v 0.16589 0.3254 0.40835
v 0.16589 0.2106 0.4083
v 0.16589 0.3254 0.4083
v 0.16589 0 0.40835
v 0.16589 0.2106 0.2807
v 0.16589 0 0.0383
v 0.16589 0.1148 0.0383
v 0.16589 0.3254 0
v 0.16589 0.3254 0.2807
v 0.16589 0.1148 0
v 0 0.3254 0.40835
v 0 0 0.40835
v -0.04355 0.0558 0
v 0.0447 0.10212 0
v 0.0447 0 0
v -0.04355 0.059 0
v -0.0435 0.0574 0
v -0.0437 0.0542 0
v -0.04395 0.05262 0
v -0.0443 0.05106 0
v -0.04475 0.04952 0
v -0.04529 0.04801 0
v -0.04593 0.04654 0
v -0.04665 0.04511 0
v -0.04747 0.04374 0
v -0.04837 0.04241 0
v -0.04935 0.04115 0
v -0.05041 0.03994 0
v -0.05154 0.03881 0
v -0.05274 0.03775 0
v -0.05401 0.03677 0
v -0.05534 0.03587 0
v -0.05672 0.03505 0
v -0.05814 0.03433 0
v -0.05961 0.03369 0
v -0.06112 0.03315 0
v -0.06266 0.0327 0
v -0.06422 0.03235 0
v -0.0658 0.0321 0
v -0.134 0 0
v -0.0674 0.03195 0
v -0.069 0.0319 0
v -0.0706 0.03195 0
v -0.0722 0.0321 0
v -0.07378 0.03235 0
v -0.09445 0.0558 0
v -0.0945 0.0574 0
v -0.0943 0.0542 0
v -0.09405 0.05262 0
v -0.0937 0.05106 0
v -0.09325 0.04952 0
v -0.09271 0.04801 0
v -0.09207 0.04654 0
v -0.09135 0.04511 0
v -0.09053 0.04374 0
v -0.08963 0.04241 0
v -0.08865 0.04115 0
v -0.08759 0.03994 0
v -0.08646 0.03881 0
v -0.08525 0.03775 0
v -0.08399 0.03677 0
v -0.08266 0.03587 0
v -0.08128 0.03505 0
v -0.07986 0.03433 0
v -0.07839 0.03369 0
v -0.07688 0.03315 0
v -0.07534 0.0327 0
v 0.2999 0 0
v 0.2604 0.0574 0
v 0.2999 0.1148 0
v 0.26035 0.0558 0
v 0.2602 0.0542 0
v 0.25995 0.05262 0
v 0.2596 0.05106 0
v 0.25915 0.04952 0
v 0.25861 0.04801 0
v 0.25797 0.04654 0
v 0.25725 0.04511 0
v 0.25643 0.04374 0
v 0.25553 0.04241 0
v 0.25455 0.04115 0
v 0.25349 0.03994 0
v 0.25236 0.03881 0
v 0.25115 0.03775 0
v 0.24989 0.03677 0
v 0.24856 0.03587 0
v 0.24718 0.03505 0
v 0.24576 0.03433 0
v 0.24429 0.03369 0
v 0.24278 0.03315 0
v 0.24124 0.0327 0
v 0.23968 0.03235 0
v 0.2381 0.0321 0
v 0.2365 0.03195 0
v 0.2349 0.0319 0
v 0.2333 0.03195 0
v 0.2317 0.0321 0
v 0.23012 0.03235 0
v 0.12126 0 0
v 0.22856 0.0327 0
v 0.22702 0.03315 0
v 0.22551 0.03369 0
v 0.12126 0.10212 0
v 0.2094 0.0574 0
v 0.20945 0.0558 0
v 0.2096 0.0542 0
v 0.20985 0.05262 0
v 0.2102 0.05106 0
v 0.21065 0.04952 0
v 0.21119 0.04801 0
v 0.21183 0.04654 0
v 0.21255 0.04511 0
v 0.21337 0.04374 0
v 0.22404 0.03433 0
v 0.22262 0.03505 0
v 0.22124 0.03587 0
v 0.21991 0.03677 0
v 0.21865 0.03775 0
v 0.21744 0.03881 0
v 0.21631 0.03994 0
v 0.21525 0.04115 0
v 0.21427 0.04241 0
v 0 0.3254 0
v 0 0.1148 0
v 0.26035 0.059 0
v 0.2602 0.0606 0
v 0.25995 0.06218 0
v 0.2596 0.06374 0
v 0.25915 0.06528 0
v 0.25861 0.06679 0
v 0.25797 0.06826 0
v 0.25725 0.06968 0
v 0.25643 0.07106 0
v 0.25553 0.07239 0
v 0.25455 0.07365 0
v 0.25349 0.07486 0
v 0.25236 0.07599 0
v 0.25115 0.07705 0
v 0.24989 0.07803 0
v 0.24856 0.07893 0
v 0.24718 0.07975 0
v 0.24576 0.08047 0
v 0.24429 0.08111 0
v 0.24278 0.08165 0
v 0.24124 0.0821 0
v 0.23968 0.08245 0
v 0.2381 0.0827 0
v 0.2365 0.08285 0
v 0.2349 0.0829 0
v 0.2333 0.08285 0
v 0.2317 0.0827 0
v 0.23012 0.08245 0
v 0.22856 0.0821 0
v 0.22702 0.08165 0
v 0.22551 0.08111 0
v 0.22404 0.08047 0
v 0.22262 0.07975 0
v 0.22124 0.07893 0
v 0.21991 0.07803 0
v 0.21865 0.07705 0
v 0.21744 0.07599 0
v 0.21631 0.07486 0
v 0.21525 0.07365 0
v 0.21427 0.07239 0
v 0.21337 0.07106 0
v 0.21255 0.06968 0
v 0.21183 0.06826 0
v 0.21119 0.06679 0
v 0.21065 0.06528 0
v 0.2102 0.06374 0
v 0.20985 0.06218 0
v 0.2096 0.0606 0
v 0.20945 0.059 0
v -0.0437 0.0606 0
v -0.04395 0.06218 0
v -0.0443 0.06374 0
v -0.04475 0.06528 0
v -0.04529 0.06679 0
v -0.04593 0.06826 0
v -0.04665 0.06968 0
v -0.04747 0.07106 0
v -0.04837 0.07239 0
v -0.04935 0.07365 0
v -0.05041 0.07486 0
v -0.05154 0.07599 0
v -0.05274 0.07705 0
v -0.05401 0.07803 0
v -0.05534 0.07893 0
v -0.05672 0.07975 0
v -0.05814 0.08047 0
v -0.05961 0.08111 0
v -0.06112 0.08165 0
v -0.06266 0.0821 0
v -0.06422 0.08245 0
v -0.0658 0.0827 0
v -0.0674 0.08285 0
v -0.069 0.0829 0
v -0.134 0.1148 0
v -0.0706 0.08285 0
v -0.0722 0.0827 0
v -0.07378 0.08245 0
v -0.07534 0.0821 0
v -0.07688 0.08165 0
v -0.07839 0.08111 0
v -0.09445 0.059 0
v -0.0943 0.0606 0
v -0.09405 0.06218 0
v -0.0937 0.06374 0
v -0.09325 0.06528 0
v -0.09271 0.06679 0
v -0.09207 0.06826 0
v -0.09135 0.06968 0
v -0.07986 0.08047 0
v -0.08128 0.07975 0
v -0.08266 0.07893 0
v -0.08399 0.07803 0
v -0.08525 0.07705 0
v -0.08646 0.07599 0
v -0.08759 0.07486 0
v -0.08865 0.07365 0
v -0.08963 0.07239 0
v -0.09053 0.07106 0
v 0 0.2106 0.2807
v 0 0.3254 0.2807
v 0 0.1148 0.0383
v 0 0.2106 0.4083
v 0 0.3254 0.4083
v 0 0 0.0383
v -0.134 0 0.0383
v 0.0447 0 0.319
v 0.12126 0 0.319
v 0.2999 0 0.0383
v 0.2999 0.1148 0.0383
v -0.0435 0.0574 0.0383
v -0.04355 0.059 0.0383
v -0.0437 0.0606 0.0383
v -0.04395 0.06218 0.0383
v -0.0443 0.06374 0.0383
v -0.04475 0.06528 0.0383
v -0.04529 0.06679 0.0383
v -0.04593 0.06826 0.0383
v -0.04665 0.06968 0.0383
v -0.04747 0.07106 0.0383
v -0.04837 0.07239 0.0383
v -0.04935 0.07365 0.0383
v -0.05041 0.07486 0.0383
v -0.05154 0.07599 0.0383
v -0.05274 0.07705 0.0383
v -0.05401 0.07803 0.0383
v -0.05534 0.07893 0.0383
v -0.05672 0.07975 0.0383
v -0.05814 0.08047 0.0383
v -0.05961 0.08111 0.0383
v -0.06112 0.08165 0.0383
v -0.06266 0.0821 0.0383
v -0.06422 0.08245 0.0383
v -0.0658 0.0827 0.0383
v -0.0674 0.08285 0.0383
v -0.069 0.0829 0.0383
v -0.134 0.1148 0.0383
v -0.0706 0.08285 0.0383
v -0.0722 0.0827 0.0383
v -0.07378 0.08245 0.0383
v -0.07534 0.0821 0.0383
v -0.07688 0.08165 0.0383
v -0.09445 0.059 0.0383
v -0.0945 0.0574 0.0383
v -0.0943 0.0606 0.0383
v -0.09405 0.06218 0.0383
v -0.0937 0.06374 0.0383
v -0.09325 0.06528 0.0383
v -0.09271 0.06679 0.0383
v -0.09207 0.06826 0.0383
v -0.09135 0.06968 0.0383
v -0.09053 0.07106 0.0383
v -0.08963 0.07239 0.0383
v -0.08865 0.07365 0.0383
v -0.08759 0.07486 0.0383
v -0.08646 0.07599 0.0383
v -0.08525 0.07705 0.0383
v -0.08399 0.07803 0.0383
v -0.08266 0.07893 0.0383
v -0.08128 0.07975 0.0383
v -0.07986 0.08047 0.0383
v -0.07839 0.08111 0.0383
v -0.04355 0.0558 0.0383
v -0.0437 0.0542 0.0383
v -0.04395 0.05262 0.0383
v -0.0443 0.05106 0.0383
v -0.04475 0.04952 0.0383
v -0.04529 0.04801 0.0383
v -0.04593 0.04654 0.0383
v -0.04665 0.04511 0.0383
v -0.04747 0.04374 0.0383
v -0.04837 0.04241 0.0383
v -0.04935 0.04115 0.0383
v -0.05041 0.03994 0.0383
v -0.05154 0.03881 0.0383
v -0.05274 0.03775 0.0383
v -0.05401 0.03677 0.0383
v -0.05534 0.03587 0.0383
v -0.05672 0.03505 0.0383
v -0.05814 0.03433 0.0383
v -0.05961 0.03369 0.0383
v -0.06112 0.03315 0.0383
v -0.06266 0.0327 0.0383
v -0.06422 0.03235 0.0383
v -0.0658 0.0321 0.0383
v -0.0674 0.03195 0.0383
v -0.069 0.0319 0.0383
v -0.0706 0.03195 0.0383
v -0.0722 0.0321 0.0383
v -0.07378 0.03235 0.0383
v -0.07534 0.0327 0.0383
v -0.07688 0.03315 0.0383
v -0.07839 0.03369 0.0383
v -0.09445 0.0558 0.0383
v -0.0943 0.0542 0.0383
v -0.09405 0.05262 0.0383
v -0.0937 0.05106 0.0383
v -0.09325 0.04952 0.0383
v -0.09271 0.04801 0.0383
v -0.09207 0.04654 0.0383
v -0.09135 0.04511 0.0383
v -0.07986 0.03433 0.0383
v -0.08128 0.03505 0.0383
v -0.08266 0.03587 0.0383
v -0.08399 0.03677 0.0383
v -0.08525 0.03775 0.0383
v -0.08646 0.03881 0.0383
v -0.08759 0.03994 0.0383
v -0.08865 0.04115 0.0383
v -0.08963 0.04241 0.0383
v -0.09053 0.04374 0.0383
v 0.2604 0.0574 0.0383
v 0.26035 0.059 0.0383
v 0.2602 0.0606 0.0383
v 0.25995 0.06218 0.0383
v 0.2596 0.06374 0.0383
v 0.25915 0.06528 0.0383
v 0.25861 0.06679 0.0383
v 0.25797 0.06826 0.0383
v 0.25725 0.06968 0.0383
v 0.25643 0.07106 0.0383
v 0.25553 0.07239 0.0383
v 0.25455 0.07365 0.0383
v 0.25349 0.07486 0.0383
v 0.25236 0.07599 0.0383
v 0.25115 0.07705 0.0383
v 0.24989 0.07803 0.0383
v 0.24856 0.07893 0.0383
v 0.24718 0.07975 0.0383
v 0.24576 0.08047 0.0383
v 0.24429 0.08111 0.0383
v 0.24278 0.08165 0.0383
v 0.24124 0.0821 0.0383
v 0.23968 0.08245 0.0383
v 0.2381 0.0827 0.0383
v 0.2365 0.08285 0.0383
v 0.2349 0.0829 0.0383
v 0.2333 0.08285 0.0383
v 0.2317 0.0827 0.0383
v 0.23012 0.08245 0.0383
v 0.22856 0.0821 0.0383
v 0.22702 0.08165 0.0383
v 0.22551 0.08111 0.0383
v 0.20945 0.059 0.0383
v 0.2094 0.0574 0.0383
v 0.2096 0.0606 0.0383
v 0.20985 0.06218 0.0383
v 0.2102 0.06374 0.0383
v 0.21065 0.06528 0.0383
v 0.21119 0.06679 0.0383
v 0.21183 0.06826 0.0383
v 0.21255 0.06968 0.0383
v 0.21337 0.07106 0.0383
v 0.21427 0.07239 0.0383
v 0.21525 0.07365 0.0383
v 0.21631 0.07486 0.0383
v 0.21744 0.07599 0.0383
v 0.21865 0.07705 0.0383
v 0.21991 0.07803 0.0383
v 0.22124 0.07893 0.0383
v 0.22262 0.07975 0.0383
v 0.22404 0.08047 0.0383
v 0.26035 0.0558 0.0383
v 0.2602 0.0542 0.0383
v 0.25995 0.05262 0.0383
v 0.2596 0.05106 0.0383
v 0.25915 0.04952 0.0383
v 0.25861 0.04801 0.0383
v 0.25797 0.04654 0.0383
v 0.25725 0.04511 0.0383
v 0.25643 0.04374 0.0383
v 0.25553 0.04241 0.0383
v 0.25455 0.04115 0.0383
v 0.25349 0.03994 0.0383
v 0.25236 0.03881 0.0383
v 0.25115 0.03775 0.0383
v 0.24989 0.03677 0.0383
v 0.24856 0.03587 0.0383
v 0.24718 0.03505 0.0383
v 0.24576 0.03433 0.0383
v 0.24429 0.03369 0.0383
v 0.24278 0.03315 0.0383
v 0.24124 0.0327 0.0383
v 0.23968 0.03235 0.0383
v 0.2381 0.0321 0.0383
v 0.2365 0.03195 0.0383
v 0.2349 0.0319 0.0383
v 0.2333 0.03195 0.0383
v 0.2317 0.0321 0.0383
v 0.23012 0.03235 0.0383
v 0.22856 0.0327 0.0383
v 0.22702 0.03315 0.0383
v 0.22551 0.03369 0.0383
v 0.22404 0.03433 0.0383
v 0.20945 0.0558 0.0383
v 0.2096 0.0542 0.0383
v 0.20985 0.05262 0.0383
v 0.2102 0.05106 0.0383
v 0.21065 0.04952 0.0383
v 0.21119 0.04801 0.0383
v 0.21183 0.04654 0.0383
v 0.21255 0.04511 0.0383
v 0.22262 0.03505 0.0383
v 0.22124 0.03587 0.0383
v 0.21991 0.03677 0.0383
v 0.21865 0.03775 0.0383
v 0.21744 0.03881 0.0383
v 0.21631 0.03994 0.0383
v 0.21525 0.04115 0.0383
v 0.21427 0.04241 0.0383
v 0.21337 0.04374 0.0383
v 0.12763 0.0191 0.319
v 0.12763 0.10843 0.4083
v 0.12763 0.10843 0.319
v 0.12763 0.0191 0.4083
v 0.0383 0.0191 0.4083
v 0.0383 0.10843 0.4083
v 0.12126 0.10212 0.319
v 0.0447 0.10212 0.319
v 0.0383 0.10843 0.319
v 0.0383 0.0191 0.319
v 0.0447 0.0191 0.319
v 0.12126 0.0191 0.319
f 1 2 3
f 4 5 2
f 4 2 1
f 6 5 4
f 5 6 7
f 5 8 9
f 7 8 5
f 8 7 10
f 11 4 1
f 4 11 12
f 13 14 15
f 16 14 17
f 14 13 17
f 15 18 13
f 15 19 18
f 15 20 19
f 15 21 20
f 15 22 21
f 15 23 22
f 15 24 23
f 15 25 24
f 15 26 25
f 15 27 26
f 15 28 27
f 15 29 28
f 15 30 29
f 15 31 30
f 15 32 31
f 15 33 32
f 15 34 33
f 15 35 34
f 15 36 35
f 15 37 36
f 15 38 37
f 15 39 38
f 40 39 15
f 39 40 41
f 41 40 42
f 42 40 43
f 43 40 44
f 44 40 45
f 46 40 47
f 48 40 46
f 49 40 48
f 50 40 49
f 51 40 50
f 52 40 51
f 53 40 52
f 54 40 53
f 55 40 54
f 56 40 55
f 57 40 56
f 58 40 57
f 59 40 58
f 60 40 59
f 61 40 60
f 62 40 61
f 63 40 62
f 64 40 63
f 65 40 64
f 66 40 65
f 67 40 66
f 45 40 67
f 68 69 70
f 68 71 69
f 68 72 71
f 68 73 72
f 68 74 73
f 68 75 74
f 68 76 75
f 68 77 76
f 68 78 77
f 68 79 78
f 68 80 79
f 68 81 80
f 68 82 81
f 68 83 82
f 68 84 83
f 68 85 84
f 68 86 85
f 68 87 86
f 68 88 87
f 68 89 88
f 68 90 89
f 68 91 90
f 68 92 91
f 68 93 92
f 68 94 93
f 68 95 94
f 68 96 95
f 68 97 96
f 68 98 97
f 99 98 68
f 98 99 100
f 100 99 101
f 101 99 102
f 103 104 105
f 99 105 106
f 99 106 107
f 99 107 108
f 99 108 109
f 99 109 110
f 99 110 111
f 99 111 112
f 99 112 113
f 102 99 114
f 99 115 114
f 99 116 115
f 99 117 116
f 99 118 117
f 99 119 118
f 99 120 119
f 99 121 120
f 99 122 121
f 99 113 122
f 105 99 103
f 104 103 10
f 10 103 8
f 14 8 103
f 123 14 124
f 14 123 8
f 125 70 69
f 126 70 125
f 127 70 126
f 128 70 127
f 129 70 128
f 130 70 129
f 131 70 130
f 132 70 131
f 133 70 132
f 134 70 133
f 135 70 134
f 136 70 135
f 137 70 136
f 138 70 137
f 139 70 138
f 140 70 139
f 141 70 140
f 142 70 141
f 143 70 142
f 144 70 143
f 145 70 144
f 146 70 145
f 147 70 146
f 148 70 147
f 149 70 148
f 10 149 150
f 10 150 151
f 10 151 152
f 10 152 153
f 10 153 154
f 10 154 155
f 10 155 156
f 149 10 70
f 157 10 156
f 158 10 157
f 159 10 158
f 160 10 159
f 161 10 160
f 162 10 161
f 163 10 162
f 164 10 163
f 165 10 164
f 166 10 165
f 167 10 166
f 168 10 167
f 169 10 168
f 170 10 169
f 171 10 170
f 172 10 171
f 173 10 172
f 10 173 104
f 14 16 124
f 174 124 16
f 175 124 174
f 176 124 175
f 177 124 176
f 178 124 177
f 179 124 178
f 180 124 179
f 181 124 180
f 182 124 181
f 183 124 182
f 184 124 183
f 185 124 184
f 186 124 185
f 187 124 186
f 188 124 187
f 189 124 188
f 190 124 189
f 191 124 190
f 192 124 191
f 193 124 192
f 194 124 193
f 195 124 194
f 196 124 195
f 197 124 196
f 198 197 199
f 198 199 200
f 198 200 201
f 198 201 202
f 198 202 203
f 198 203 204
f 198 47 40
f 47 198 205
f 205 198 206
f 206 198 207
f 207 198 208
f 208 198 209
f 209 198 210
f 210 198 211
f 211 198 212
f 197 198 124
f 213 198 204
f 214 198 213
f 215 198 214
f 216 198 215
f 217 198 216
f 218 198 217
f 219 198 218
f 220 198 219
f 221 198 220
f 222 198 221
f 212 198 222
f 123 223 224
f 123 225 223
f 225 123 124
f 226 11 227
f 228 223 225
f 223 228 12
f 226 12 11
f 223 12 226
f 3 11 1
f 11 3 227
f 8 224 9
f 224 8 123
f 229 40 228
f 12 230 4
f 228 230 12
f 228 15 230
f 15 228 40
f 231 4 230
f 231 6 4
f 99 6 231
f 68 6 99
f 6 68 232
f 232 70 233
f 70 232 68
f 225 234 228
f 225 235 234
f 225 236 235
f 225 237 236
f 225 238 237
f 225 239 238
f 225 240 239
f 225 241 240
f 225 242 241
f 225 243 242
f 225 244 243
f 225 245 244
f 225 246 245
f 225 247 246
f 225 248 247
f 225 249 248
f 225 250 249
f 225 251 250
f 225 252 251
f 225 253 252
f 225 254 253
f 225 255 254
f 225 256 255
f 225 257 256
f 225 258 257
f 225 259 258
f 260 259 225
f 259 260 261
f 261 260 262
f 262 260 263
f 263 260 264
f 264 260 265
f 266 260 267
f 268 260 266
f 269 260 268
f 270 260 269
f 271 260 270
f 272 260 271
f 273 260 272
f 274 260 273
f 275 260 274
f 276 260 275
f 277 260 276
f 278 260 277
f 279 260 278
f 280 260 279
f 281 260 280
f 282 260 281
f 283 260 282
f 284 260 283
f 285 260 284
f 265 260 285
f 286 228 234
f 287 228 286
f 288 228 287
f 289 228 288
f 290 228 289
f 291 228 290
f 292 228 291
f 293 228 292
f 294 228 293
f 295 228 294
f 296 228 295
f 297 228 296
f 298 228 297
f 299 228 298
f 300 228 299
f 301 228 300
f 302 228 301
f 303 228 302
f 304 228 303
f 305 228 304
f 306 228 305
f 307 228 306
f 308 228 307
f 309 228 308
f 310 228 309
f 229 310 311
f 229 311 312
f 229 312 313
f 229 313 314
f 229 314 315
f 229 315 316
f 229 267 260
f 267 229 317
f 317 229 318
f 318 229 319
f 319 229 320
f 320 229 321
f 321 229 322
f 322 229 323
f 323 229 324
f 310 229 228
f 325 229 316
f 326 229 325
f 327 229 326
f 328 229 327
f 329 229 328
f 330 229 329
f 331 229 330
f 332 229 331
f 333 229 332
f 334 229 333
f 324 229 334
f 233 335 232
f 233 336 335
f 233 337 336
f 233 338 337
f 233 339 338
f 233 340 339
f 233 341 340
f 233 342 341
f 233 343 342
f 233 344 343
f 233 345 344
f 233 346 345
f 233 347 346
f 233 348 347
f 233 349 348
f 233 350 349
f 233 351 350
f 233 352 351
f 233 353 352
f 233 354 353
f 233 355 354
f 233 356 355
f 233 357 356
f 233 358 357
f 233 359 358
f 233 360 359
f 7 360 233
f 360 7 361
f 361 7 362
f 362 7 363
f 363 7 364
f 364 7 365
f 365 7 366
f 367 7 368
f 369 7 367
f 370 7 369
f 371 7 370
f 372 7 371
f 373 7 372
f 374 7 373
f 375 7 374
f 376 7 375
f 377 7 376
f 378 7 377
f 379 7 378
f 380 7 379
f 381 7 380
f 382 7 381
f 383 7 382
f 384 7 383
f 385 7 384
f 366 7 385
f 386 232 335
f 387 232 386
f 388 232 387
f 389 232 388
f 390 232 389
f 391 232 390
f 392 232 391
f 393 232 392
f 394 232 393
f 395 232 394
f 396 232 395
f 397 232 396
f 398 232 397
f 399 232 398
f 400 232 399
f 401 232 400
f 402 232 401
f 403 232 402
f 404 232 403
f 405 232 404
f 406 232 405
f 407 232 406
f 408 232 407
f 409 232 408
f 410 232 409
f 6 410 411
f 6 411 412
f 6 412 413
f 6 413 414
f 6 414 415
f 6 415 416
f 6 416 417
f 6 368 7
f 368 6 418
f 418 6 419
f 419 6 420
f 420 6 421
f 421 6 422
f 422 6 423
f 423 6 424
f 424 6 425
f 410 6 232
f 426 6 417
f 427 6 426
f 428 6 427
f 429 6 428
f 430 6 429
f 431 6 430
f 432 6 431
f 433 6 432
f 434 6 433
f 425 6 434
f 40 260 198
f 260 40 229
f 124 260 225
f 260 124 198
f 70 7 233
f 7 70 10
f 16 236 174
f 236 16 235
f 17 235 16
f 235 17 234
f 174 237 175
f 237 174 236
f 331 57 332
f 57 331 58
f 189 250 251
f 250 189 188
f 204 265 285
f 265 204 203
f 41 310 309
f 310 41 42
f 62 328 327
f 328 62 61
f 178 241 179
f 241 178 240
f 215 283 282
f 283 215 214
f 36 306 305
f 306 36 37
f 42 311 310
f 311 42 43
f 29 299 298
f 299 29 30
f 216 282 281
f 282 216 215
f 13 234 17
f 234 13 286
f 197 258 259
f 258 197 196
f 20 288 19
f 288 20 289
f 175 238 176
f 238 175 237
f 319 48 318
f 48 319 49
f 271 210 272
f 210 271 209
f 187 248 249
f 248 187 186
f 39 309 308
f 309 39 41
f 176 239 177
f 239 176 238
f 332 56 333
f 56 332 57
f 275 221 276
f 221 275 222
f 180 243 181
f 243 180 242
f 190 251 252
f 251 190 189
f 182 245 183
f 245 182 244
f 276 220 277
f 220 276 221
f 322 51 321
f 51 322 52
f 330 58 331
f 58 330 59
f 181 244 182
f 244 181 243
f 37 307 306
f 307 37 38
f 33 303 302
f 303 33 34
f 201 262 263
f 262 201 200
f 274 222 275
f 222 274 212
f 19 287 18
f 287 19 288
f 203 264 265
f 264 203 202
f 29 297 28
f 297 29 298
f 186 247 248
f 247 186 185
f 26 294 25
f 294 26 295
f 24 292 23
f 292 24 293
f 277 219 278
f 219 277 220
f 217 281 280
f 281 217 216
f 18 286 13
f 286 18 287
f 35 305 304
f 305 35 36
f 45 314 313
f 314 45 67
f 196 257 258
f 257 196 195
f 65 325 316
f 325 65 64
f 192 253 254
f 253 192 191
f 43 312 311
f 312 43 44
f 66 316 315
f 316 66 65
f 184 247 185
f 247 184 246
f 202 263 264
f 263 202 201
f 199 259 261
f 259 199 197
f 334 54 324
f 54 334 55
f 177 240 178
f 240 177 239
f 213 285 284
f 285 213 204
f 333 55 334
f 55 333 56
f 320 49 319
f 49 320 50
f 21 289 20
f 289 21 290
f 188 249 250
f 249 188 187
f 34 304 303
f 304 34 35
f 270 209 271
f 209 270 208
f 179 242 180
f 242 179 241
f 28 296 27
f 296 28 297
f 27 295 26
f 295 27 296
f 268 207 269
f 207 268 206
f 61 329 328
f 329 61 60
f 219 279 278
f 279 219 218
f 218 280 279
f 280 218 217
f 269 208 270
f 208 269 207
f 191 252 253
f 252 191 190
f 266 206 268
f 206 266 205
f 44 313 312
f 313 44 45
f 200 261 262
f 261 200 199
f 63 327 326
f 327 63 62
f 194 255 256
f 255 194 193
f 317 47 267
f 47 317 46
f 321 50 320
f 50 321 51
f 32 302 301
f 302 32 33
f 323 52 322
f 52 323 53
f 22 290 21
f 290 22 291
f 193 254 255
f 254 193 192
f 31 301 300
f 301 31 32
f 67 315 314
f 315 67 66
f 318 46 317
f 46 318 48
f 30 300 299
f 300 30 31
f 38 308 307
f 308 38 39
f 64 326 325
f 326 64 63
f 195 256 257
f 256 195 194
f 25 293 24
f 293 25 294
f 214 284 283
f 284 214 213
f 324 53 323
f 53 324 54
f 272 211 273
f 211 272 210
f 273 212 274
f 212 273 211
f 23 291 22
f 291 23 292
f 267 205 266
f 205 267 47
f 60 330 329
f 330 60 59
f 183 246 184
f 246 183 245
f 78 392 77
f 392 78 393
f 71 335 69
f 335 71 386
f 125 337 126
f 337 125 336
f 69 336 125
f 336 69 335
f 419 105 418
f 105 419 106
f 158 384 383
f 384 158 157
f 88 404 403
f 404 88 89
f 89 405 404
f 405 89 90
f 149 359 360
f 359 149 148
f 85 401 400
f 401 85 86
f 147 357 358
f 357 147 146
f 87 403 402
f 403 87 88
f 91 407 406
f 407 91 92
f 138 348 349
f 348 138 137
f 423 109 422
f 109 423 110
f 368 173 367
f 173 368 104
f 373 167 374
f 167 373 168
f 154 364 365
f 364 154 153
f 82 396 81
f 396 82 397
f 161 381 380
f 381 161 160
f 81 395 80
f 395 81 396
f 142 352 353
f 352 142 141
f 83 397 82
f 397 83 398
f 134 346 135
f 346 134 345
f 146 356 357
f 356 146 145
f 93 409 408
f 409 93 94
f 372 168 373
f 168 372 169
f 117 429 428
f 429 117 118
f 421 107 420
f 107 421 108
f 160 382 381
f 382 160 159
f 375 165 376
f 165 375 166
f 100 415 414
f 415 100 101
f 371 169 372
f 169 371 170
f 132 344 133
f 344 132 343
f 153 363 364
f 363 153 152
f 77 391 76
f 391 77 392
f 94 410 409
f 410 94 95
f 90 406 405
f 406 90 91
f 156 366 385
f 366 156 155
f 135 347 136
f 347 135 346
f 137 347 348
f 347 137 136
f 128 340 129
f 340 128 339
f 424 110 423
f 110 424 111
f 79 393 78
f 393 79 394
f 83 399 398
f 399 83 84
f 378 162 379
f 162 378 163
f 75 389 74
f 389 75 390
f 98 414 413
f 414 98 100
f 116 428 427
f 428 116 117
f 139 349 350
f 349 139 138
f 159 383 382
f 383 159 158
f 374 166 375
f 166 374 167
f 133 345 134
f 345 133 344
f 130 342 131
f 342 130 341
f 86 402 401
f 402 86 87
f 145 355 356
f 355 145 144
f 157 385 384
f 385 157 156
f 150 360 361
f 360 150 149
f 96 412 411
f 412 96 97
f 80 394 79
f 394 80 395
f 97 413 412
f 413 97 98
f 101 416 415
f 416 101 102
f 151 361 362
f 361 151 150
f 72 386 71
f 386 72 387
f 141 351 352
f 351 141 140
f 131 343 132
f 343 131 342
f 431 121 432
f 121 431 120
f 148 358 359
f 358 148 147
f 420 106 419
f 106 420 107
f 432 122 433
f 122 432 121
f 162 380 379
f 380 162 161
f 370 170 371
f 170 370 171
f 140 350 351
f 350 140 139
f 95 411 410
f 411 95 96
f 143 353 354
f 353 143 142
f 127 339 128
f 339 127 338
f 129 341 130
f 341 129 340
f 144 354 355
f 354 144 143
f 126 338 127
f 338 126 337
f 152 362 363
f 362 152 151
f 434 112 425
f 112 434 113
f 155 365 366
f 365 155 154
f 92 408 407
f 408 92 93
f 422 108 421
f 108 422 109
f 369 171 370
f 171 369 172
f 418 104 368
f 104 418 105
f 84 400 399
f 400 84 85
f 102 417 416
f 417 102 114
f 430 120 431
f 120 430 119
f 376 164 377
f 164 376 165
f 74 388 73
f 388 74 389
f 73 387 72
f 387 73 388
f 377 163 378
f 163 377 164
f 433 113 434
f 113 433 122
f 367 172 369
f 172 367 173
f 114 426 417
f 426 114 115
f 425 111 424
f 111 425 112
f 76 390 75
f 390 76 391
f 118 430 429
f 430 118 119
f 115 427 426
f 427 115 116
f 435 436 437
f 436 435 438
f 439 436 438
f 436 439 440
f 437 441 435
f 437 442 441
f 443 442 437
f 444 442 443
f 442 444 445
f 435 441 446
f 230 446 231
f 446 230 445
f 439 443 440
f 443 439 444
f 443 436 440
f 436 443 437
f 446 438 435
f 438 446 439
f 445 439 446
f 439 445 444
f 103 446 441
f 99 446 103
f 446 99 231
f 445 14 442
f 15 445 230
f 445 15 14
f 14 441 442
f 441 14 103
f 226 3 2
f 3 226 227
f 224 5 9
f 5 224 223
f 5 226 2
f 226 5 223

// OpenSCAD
// === Parameters ===
// Main base block
base_length = 0.165891;      // X dimension
base_width  = 0.325401;      // Y dimension (front to back)
base_height = 0.408347;      // Z dimension

// Square recess (cut from top)
recess_size      = 0.089326; // side length of square
recess_x_offset  = 0.0383;   // from left edge (centered: same right)
recess_y_offset  = 0.0191;   // from front edge
recess_z_bottom  = 0.319;    // vertical band start
recess_z_top     = 0.4083;   // vertical band end (top)

// Lower rectangular opening (through cut)
lower_x_size     = 0.076565; // X width
lower_y_size     = 0.132416; // Y depth
lower_x_offset   = 0.0447;   // from left edge
lower_y_offset   = -0.0303;  // from front edge (negative = breaks out)
lower_z_bottom   = 0;        // vertical band start
lower_z_top      = 0.319;    // vertical band end

// Upper back strip removal (creates high-to-low step)
strip_y_size     = 0.114848; // Y width of removed strip
strip_y_start    = 0.2106;   // front edge of strip
strip_z_bottom   = 0.2807;   // vertical band start
strip_z_top      = 0.4083;   // vertical band end
// cut depth = 0.1276 (strip_z_top - strip_z_bottom)

// Shallow front base extension
shallow_height   = 0.0383;
shallow_x_total  = 0.4339;   // total X span
shallow_y_size   = 0.1148;   // Y span (front portion)
shallow_x_overhang = 0.134;  // projection beyond each side of main base

// Circular through holes in shallow section
hole_radius      = 0.0255;
hole_y_offset    = 0.0574;   // from front edge
hole_x_positions = [-0.069, 0.2349]; // from main base left edge

$fn = 100;

// === Main Model ===
difference() {
    union() {
        // 1. Main rectangular base block
        cube([base_length, base_width, base_height]);

        // 2. Shallow front base extension
        //    Projects 0.134 beyond left and right of main base
        //    Occupies front 0.1148 of width
        translate([-shallow_x_overhang, 0, 0])
            cube([shallow_x_total, shallow_y_size, shallow_height]);
    }

    // 3. Square recess cut from top
    //    Centered in X with 0.0383 offsets left/right
    //    Front offset 0.0191, back offset 0.217
    //    Vertical band 0.319 to 0.4083 (depth 0.0893 from top)
    translate([recess_x_offset, recess_y_offset, recess_z_bottom])
        cube([recess_size, recess_size, recess_z_top - recess_z_bottom]);

    // 4. Lower rectangular opening through vertical band 0 to 0.319
    //    Left offset 0.0447, front offset -0.0303 (breaks front face)
    translate([lower_x_offset, lower_y_offset, lower_z_bottom])
        cube([lower_x_size, lower_y_size, lower_z_top - lower_z_bottom]);

    // 5. Upper back strip removal (high-to-low step)
    //    Full length, width 0.114848, leaving 0.2106 in front
    //    Z band 0.2807 to 0.4083, cut depth 0.1276
    translate([0, strip_y_start, strip_z_bottom])
        cube([base_length, strip_y_size, strip_z_top - strip_z_bottom]);

    // 6. Two circular through holes in shallow section
    //    Radius 0.0255, at Y offset 0.0574 from front
    //    X positions at -0.069 and 0.2349 from main base left edge
    for (x_pos = hole_x_positions) {
        translate([x_pos, hole_y_offset, -0.001])
            cylinder(h = shallow_height + 0.002, r = hole_radius);
    }
}
